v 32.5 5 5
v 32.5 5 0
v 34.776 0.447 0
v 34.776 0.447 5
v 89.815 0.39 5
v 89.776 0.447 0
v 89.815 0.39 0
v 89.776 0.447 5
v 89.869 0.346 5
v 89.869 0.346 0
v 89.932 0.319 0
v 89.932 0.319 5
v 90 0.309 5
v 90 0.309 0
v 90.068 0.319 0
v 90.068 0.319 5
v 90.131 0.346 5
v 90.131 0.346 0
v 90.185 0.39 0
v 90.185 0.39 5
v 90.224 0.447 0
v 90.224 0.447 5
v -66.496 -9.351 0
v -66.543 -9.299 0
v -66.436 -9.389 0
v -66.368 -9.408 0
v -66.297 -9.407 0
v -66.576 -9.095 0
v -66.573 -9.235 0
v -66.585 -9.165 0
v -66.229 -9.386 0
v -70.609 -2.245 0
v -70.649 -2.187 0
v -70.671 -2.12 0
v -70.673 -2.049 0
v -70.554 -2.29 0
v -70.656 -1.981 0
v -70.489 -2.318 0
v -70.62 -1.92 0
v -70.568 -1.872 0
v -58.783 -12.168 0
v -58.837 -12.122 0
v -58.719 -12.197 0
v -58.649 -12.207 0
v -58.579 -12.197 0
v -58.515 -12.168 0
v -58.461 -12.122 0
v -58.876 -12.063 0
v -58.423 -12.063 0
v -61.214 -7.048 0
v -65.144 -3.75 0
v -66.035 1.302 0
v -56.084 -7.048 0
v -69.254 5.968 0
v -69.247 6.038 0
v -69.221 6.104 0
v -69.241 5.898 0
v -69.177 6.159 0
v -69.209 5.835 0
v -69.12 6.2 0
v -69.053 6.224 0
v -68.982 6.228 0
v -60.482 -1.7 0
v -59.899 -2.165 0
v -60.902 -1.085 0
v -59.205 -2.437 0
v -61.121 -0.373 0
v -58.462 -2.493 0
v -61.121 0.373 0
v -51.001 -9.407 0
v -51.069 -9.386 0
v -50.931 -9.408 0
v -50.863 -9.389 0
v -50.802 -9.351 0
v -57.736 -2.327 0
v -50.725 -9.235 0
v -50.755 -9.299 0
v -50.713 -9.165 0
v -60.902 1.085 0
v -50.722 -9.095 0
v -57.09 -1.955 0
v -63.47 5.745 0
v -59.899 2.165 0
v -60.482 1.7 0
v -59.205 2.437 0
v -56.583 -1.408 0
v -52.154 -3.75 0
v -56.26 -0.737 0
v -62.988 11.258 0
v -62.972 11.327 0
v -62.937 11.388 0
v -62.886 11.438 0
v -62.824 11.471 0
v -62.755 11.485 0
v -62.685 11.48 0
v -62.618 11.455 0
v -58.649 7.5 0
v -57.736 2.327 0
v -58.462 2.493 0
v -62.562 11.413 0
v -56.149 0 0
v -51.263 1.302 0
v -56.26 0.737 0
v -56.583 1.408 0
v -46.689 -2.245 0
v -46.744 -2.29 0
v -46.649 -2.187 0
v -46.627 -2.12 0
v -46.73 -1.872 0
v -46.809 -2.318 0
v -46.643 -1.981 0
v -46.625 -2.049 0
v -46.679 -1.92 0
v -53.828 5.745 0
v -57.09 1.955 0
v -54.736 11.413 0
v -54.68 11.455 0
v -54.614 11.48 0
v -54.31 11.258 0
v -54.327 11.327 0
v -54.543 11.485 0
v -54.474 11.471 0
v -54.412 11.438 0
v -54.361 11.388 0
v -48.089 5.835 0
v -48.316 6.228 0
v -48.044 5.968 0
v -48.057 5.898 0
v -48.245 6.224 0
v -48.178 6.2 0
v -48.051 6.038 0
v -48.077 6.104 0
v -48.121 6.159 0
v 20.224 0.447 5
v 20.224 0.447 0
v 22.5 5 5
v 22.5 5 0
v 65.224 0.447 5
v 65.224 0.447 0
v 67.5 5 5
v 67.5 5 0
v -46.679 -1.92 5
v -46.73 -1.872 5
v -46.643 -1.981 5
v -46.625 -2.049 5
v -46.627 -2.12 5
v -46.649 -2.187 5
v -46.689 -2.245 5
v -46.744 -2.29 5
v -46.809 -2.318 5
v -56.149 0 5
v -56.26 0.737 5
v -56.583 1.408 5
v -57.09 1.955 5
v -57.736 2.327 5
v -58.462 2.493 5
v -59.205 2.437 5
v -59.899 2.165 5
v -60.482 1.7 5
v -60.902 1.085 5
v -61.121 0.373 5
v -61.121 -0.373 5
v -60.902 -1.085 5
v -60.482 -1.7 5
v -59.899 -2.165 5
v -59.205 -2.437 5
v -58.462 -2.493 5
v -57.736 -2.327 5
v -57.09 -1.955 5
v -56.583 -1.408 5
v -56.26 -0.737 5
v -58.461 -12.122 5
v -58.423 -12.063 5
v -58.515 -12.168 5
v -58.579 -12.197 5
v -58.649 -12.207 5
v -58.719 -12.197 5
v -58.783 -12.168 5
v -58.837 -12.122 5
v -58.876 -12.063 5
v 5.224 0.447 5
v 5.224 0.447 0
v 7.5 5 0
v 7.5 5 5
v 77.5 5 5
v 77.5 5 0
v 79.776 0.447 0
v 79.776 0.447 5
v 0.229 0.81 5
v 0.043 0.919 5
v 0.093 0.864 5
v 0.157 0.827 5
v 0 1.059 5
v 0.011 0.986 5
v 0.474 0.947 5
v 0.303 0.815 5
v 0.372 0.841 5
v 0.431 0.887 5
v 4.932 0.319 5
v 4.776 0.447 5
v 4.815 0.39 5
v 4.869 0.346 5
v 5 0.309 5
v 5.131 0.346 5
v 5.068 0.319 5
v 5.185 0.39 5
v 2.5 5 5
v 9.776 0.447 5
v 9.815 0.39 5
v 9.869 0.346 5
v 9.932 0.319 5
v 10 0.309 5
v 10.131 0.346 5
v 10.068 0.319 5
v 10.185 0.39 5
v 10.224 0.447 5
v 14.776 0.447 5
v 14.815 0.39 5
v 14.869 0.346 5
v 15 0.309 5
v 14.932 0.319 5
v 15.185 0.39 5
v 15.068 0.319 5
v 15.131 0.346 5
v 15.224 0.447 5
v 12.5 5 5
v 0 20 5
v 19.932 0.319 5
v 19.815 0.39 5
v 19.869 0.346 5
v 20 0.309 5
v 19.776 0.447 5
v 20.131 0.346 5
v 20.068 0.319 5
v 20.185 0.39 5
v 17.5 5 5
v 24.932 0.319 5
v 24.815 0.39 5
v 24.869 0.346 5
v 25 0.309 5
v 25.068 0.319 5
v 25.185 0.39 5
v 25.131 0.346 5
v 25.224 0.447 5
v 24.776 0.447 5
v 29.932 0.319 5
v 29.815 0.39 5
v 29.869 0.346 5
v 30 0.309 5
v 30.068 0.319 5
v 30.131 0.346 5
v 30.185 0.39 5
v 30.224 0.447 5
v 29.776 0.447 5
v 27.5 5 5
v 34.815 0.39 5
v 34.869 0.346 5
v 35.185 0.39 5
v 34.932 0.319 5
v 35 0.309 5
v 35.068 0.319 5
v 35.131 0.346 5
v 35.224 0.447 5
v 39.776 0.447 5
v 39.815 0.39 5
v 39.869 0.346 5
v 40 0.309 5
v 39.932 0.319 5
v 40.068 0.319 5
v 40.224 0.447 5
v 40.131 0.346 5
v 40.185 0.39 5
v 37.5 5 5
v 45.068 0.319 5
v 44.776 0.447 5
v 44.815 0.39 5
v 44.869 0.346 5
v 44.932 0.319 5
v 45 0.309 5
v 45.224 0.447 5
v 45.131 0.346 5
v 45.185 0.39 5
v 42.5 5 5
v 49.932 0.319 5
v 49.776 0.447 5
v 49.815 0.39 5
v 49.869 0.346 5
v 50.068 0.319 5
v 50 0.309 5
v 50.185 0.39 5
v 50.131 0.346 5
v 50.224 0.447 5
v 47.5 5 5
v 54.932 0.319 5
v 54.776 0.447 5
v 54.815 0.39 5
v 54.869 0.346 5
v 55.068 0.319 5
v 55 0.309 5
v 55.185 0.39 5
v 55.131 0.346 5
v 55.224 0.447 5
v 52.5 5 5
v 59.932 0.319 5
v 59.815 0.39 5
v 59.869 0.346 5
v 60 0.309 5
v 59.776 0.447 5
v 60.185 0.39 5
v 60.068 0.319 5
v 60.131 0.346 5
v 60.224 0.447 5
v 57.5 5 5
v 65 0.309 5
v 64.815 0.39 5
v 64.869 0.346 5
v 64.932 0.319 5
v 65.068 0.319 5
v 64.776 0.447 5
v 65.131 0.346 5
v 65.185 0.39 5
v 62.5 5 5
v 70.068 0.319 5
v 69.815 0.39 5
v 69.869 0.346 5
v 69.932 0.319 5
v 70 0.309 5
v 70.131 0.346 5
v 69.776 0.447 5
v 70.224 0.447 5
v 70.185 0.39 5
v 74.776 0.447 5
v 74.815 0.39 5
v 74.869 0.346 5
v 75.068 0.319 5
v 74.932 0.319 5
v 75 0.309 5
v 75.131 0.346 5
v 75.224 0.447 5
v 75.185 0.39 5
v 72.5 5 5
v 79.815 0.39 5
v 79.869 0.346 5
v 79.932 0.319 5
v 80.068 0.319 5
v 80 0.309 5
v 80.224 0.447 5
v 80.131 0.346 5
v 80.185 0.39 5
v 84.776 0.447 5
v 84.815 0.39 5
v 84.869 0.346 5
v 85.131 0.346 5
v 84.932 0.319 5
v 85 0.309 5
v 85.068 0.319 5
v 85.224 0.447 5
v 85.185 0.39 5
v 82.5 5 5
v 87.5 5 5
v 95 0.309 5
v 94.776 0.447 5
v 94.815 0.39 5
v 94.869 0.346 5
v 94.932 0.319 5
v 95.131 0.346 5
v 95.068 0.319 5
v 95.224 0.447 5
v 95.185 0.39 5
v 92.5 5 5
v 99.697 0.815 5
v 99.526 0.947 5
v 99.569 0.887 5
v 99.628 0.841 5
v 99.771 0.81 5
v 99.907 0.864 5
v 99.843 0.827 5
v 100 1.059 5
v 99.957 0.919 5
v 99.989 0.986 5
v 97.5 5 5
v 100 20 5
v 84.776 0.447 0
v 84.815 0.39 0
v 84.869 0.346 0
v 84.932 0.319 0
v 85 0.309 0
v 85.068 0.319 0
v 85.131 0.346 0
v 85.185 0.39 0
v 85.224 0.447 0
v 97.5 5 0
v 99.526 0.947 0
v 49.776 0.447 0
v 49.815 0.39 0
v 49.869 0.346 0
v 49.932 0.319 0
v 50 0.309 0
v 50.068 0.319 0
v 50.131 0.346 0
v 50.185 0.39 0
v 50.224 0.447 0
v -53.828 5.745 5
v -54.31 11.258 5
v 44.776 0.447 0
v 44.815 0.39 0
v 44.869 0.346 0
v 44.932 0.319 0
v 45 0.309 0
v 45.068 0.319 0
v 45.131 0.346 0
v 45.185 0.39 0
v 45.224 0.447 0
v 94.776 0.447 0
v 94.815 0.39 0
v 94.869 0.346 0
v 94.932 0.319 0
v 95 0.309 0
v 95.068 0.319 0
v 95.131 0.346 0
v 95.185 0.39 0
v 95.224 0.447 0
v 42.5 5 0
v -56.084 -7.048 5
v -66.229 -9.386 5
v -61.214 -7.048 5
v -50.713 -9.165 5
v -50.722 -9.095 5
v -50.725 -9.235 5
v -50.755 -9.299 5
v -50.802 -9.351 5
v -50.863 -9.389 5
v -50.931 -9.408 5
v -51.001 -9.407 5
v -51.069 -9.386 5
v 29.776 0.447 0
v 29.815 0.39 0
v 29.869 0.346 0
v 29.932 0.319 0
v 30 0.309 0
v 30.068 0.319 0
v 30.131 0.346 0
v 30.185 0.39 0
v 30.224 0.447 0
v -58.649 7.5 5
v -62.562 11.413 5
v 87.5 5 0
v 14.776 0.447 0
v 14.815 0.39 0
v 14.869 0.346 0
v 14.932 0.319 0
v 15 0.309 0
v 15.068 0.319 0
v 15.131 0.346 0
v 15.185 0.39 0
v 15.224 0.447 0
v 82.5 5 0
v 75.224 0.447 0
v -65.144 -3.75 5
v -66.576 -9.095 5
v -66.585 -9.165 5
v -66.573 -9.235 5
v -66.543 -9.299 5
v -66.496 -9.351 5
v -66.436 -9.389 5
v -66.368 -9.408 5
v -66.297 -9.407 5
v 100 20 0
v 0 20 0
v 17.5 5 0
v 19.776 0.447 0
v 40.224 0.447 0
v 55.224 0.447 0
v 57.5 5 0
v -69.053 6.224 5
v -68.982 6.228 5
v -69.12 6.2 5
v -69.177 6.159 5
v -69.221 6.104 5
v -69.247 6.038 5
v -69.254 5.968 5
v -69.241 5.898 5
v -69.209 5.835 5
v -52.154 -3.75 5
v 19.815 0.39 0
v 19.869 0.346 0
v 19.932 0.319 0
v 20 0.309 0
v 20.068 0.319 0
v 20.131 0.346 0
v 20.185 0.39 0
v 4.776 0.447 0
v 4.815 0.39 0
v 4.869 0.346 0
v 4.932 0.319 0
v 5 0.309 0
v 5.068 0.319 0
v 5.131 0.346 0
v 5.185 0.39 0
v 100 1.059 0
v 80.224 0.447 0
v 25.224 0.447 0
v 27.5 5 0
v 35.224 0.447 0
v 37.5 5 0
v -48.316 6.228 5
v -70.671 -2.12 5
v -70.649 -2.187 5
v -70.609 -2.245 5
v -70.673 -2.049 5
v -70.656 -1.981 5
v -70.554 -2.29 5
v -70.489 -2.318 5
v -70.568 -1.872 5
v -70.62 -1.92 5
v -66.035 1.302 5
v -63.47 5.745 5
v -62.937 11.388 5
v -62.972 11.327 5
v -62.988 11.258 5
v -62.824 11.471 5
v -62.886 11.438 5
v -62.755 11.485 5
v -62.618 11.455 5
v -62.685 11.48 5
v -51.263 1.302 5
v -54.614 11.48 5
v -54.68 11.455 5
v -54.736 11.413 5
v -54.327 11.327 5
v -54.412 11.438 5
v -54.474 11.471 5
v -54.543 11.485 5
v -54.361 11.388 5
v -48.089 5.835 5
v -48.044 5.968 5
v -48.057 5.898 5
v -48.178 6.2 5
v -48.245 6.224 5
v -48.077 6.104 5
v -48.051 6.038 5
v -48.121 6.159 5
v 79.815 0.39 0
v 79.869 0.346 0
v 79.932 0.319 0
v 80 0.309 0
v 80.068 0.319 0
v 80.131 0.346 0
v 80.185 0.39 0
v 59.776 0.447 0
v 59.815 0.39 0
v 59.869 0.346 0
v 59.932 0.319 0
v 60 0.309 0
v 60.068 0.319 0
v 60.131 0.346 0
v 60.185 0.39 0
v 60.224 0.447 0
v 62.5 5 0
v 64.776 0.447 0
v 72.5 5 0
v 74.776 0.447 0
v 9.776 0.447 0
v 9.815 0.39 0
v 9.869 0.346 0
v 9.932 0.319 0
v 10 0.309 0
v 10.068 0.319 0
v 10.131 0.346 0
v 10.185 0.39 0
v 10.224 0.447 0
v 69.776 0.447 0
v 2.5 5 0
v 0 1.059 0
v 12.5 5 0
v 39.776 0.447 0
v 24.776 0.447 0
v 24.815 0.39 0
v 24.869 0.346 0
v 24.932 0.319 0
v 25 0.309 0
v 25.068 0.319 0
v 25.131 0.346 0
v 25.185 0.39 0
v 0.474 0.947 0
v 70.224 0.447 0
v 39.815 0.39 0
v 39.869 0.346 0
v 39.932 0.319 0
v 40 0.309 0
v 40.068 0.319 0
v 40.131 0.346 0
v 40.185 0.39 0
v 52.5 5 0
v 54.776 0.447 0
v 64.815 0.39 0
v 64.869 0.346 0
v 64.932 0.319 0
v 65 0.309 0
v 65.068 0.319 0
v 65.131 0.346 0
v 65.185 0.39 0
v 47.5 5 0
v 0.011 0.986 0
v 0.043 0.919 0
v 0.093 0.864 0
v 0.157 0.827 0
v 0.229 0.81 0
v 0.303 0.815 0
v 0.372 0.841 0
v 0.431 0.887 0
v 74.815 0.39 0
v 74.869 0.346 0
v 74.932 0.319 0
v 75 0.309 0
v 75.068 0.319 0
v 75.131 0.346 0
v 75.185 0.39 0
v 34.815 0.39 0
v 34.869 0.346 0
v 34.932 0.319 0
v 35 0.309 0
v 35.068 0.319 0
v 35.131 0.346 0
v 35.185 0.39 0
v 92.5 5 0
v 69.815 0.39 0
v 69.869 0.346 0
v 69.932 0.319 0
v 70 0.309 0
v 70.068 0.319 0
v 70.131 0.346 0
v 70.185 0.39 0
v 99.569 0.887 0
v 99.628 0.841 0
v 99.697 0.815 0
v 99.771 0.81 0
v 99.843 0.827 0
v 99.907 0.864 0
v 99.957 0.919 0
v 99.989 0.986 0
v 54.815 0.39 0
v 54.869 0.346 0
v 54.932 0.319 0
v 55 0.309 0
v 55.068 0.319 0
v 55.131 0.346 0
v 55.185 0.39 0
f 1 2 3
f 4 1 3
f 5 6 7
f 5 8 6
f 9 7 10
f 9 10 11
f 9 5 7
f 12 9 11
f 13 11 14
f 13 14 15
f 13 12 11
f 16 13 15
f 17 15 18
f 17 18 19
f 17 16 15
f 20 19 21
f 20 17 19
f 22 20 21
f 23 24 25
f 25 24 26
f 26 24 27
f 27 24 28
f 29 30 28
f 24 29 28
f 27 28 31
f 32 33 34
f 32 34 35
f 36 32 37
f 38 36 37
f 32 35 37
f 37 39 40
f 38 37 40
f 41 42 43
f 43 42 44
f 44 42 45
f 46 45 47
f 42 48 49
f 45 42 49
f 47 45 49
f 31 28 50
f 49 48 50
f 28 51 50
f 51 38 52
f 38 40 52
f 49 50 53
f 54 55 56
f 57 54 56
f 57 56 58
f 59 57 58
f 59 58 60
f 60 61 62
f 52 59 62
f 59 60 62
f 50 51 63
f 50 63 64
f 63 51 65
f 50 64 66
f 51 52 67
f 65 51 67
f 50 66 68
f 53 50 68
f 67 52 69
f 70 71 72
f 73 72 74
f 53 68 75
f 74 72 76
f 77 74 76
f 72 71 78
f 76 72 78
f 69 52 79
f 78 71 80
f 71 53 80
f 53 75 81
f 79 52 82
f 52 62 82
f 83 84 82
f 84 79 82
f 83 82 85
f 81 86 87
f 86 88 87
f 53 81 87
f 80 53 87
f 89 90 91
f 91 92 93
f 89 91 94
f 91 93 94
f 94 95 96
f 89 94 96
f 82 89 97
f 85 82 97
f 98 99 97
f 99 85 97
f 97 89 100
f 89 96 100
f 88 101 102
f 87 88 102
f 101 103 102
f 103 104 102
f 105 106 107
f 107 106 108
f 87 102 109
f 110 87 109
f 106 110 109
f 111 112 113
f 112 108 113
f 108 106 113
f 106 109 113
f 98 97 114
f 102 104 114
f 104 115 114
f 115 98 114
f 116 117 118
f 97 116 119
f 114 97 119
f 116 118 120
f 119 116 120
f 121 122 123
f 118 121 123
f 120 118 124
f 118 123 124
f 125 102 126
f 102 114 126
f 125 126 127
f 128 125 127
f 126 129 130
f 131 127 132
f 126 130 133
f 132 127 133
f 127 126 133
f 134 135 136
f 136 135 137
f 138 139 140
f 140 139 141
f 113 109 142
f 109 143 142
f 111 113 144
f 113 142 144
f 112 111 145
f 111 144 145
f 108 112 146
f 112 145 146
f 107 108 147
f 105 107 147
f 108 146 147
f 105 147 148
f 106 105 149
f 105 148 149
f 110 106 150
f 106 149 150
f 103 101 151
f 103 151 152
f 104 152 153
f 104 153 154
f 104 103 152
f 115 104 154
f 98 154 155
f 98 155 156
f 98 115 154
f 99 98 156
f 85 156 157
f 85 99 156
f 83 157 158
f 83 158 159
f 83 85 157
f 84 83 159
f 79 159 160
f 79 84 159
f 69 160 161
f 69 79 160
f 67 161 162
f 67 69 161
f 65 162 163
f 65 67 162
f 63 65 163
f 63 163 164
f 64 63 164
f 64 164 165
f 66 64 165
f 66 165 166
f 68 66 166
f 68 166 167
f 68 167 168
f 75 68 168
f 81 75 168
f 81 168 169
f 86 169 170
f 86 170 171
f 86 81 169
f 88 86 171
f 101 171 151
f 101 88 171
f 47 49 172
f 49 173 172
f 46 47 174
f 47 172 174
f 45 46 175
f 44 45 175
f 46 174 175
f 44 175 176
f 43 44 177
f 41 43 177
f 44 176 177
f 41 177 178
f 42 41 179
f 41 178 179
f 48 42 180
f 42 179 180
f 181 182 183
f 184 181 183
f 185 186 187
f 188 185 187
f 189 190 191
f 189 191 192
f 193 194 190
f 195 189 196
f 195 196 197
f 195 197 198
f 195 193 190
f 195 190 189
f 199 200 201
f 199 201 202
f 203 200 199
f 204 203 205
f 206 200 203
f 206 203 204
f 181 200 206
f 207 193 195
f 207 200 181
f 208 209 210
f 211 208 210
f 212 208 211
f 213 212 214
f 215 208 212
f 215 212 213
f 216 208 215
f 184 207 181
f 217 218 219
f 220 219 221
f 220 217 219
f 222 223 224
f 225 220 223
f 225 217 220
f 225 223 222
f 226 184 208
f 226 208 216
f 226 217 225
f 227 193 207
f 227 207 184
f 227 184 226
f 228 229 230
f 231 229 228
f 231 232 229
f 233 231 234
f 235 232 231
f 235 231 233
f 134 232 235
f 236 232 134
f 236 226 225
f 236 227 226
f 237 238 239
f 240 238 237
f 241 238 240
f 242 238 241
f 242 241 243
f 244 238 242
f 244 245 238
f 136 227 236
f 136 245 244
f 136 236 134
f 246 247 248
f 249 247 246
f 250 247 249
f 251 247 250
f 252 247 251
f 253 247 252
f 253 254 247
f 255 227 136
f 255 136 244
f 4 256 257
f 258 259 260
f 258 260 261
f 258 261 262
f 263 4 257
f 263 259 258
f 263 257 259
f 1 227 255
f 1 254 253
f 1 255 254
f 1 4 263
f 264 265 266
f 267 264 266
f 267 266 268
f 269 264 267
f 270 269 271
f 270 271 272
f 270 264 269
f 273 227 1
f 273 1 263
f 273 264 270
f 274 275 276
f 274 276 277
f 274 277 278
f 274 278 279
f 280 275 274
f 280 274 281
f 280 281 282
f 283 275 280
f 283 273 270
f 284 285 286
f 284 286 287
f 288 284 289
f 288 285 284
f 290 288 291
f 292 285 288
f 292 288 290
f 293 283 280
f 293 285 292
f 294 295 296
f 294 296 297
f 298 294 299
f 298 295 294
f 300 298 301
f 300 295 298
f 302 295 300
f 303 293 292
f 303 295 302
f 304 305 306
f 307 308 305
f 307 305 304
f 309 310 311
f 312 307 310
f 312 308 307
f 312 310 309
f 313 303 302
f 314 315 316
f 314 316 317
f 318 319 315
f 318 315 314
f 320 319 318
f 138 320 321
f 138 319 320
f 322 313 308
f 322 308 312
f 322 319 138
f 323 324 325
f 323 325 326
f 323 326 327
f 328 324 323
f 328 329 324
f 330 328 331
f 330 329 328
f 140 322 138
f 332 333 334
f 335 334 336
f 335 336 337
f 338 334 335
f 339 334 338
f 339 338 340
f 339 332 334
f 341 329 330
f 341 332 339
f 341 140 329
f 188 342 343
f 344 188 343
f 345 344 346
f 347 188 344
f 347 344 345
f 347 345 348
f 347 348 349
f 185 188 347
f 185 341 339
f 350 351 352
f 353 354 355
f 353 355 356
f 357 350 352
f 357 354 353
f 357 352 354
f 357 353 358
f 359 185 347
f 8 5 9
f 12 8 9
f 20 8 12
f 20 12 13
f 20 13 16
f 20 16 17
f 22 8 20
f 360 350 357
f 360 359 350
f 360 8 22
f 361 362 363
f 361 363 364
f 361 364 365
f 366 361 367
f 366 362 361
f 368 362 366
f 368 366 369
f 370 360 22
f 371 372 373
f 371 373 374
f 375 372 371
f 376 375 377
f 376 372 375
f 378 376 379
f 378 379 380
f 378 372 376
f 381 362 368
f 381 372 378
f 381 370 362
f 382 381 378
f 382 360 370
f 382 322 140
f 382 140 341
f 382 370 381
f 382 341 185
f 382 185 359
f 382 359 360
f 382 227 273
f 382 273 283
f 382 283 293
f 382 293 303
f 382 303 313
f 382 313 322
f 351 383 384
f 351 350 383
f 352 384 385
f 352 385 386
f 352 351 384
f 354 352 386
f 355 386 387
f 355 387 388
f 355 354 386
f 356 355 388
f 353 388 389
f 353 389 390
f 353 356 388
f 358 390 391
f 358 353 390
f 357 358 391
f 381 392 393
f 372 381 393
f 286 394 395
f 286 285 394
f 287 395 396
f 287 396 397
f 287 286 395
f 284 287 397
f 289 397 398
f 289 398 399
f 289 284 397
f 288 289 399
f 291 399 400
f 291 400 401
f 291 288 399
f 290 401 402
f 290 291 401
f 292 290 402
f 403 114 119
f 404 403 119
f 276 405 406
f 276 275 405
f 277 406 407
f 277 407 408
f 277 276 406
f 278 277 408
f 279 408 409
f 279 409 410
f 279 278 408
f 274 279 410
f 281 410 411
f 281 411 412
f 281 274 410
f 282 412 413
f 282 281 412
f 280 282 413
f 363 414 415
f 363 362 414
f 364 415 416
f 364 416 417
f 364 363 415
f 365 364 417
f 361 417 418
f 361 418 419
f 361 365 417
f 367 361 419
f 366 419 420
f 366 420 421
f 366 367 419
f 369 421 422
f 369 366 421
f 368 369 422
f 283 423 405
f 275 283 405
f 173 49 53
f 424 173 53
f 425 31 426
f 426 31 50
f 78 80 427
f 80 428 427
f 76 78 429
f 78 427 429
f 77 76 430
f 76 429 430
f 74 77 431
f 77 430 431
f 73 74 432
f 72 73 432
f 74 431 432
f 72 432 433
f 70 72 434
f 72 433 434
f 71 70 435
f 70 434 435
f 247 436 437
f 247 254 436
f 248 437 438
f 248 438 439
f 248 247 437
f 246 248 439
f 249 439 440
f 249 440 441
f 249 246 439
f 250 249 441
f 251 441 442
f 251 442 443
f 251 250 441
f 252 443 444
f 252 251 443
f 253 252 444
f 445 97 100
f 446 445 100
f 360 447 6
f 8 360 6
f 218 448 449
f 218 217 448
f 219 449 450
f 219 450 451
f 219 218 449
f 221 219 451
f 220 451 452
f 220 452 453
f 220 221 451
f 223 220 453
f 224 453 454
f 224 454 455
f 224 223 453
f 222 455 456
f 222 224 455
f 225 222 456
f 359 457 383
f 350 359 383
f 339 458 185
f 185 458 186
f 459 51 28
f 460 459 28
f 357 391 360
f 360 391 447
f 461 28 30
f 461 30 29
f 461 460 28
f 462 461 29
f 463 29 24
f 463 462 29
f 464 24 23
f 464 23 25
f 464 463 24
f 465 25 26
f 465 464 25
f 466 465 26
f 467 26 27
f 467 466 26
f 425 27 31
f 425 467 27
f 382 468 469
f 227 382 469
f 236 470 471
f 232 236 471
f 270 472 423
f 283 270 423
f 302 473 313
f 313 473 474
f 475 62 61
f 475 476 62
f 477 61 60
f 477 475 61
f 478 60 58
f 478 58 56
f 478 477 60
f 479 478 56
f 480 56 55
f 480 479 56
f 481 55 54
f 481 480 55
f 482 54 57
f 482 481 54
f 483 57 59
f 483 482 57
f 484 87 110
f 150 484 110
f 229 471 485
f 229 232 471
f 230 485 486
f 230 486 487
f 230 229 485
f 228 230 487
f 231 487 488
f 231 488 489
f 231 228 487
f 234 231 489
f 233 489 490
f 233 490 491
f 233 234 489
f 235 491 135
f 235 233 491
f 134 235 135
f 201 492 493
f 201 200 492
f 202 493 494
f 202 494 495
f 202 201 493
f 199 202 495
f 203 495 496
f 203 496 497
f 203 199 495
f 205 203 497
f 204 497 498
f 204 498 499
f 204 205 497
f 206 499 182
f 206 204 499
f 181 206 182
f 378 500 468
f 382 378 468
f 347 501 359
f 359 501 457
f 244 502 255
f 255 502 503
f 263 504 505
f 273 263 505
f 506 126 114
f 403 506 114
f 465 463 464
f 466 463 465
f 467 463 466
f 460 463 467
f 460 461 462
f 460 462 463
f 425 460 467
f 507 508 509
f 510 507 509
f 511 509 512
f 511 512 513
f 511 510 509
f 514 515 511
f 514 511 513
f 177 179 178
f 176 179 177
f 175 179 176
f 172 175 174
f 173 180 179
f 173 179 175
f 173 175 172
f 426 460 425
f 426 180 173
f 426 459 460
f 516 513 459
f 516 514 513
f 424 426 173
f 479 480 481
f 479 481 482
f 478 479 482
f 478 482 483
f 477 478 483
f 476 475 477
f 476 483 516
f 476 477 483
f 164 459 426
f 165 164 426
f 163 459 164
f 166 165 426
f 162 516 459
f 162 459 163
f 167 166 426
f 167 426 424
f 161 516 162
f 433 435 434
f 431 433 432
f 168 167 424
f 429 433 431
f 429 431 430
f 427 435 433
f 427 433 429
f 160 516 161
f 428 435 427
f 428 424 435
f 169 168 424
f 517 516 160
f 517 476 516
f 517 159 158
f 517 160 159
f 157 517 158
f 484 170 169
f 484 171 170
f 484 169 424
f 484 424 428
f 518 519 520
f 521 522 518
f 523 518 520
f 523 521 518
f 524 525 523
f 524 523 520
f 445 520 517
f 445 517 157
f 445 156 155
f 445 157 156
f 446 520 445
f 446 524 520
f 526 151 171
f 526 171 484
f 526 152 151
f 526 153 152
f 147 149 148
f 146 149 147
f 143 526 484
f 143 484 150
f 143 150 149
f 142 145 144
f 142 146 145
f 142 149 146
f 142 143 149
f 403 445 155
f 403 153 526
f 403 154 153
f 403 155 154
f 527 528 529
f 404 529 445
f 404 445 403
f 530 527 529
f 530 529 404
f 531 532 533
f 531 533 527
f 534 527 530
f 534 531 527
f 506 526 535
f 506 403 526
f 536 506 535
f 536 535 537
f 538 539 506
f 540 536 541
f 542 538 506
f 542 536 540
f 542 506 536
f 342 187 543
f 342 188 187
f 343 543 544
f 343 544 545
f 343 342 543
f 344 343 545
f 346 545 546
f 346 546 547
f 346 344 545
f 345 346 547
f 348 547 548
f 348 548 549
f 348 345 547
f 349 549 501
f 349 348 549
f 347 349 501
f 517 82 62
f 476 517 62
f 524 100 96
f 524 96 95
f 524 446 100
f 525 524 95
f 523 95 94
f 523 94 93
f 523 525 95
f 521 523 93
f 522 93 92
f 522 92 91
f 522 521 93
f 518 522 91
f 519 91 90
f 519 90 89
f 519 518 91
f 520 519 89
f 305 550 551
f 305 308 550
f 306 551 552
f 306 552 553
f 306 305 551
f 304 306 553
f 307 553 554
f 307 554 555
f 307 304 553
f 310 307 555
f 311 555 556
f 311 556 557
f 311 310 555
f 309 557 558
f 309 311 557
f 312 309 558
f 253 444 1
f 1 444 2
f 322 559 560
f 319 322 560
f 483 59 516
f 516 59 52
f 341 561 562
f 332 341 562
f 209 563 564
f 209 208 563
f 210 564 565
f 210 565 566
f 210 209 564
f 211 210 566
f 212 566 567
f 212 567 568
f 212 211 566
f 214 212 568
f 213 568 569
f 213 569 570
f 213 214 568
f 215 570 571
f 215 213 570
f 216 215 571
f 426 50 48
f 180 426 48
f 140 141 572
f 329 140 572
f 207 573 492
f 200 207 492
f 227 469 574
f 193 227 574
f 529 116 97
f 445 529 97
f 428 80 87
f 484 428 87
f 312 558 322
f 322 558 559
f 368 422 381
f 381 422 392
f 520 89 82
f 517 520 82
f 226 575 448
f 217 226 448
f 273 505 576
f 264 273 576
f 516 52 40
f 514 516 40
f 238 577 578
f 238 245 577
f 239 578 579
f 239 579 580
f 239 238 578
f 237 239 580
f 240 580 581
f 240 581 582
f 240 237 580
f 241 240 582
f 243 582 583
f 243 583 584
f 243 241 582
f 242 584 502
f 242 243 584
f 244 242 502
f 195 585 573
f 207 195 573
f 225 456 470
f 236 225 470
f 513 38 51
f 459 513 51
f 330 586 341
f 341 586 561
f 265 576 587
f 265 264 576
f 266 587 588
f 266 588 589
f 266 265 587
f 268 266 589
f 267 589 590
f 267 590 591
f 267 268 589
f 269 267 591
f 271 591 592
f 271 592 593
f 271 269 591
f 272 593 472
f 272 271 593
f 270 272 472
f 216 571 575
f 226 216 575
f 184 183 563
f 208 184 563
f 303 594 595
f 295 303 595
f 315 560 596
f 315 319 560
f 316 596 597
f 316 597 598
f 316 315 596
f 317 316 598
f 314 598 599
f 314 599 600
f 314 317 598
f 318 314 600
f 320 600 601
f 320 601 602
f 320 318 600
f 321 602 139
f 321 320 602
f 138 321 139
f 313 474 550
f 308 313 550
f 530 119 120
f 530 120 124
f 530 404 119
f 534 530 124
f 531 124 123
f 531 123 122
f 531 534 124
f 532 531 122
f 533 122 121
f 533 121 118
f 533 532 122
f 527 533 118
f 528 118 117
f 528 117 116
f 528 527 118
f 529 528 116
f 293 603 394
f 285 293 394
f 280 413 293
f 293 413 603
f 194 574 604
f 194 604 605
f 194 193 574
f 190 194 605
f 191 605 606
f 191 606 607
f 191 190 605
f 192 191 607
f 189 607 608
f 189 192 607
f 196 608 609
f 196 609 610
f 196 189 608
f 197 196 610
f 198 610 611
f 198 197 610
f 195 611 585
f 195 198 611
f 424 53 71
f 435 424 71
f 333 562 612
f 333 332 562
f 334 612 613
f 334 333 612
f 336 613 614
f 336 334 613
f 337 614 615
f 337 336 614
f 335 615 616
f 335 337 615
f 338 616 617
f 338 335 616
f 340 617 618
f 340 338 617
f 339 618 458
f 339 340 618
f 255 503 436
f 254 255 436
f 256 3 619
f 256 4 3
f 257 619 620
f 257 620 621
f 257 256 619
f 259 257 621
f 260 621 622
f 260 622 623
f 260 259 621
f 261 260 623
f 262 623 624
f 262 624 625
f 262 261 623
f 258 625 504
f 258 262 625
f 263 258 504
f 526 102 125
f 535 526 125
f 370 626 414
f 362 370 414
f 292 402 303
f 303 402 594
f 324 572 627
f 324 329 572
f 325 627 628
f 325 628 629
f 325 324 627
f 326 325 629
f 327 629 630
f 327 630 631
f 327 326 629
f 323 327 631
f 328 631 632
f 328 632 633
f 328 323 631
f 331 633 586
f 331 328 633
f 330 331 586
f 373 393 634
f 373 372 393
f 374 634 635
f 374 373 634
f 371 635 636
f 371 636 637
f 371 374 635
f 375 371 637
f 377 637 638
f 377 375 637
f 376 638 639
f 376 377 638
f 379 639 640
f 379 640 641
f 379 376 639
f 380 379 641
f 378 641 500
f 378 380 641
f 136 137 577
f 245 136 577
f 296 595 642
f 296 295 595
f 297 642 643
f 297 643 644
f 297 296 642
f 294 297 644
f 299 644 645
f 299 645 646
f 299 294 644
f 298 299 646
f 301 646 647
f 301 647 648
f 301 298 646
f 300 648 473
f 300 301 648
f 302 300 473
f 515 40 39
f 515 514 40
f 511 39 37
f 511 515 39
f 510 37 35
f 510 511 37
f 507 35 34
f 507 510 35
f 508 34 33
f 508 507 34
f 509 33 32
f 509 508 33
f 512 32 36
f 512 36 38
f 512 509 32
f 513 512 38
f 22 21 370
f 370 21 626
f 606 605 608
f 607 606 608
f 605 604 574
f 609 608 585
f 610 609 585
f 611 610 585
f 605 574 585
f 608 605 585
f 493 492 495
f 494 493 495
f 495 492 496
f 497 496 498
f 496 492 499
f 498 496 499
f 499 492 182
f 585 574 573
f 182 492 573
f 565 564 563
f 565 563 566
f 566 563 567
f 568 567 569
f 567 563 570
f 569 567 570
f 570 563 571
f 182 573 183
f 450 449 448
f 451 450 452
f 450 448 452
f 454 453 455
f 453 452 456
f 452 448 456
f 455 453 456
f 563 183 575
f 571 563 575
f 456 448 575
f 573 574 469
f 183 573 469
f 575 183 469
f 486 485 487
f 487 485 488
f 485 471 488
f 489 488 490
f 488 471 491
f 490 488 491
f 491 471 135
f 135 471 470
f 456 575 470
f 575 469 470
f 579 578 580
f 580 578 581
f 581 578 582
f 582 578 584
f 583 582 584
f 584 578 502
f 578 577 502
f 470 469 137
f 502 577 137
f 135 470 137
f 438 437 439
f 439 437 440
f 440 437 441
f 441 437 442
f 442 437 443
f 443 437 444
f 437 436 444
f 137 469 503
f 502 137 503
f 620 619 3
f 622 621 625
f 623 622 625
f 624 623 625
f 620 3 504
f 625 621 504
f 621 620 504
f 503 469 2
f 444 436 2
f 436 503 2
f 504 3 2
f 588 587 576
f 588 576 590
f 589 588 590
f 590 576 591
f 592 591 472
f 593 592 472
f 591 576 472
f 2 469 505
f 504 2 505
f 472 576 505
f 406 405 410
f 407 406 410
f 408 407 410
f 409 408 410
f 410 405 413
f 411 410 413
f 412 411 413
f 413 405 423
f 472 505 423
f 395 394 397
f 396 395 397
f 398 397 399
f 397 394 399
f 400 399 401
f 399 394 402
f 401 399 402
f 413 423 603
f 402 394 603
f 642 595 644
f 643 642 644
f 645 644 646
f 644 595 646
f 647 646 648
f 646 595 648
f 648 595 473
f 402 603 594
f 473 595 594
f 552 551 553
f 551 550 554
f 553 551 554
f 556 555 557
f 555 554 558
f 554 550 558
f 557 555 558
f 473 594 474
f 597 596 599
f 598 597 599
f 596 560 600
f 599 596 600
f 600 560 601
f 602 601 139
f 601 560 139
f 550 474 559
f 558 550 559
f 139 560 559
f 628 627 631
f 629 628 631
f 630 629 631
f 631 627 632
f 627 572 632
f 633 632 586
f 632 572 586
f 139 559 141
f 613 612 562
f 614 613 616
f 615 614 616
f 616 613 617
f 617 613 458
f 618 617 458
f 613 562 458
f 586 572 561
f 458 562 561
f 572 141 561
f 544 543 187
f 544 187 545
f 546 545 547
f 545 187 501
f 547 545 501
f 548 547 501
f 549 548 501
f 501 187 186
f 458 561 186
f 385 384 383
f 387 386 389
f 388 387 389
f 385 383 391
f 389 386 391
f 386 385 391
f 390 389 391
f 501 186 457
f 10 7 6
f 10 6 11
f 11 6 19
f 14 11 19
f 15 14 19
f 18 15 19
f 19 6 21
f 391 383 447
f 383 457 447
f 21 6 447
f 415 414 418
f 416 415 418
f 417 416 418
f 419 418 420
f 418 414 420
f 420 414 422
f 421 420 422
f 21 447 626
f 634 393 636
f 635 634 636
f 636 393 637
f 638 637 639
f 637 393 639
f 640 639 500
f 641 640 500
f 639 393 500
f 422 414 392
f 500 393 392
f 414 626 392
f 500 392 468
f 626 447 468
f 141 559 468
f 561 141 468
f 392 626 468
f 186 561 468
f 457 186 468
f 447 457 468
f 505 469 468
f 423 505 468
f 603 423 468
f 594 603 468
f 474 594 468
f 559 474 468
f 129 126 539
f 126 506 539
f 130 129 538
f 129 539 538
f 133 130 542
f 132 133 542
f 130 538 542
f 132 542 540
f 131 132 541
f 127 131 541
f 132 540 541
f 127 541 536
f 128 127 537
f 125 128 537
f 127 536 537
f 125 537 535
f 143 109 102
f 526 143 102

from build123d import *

# Parameters (mm, degrees)
F1_DEPTH = 5
F2_R     = 0.25
F3_R     = 2.5
F4_DEPTH = 5
F5_R     = 0.25


with BuildPart() as f1:
    # F0 (on Top) → F1 (new body)
    with BuildSketch(Plane.XY):
        Polygon((100, 20), (0, 20), (0, 0), (2.5, 5), (5, 0), (7.5, 5), (10, 0), (12.5, 5), (15, 0), (17.5, 5), (20, 0), (22.5, 5), (25, 0), (27.5, 5), (30, 0), (32.5, 5), (35, 0), (37.5, 5), (40, 0), (42.5, 5), (45, 0), (47.5, 5), (50, 0), (52.5, 5), (55, 0), (57.5, 5), (60, 0), (62.5, 5), (65, 0), (67.5, 5), (70, 0), (72.5, 5), (75, 0), (77.5, 5), (80, 0), (82.5, 5), (85, 0), (87.5, 5), (90, 0), (92.5, 5), (95, 0), (97.5, 5), (100, 0), align=None)
    extrude(amount=F1_DEPTH)

    # F2
    f2_edges = [f1.edges().sort_by_distance(p)[0] for p in [
        (5, 0, 2.5),
        (10, 0, 2.5),
        (15, 0, 2.5),
        (0, 0, 2.5),
        (20, 0, 2.5),
        (25, 0, 2.5),
        (30, 0, 2.5),
        (35, 0, 2.5),
        (40, 0, 2.5),
        (45, 0, 2.5),
        (50, 0, 2.5),
        (55, 0, 2.5),
        (60, 0, 2.5),
        (65, 0, 2.5),
        (70, 0, 2.5),
        (80, 0, 2.5),
        (85, 0, 2.5),
        (90, 0, 2.5),
        (95, 0, 2.5),
        (100, 0, 2.5),
        (75, 0, 2.5),
    ]]
    fillet(f2_edges, radius=F2_R)


with BuildPart() as f4:
    # F3 (on Top) → F4 (new body)
    with BuildSketch(Plane.XY):
        Polygon((-53.828175, 5.745333), (-54.357181, 11.791901), (-58.649082, 7.5), (-62.940983, 11.791901), (-63.469989, 5.745333), (-69.516557, 6.274339), (-66.03514, 1.302361), (-71.007118, -2.179055), (-65.144272, -3.75), (-66.715217, -9.612846), (-61.214233, -7.047695), (-58.649082, -12.548679), (-56.083931, -7.047695), (-50.582947, -9.612846), (-52.153891, -3.75), (-46.291046, -2.179055), (-51.263024, 1.302361), (-47.781607, 6.274339), align=None)
        with Locations((-58.649082, 0)):
            Circle(F3_R, mode=Mode.SUBTRACT)
    extrude(amount=F4_DEPTH)

    # F5
    f5_edges = [f4.edges().sort_by_distance(p)[0] for p in [
        (-62.940983, 11.791901, 2.5),
        (-54.357181, 11.791901, 2.5),
        (-47.781607, 6.274339, 2.5),
        (-46.291046, -2.179055, 2.5),
        (-50.582947, -9.612846, 2.5),
        (-58.649082, -12.548679, 2.5),
        (-66.715217, -9.612846, 2.5),
        (-71.007118, -2.179055, 2.5),
        (-69.516557, 6.274339, 2.5),
    ]]
    fillet(f5_edges, radius=F5_R)


solid = Compound([f1.part, f4.part])
